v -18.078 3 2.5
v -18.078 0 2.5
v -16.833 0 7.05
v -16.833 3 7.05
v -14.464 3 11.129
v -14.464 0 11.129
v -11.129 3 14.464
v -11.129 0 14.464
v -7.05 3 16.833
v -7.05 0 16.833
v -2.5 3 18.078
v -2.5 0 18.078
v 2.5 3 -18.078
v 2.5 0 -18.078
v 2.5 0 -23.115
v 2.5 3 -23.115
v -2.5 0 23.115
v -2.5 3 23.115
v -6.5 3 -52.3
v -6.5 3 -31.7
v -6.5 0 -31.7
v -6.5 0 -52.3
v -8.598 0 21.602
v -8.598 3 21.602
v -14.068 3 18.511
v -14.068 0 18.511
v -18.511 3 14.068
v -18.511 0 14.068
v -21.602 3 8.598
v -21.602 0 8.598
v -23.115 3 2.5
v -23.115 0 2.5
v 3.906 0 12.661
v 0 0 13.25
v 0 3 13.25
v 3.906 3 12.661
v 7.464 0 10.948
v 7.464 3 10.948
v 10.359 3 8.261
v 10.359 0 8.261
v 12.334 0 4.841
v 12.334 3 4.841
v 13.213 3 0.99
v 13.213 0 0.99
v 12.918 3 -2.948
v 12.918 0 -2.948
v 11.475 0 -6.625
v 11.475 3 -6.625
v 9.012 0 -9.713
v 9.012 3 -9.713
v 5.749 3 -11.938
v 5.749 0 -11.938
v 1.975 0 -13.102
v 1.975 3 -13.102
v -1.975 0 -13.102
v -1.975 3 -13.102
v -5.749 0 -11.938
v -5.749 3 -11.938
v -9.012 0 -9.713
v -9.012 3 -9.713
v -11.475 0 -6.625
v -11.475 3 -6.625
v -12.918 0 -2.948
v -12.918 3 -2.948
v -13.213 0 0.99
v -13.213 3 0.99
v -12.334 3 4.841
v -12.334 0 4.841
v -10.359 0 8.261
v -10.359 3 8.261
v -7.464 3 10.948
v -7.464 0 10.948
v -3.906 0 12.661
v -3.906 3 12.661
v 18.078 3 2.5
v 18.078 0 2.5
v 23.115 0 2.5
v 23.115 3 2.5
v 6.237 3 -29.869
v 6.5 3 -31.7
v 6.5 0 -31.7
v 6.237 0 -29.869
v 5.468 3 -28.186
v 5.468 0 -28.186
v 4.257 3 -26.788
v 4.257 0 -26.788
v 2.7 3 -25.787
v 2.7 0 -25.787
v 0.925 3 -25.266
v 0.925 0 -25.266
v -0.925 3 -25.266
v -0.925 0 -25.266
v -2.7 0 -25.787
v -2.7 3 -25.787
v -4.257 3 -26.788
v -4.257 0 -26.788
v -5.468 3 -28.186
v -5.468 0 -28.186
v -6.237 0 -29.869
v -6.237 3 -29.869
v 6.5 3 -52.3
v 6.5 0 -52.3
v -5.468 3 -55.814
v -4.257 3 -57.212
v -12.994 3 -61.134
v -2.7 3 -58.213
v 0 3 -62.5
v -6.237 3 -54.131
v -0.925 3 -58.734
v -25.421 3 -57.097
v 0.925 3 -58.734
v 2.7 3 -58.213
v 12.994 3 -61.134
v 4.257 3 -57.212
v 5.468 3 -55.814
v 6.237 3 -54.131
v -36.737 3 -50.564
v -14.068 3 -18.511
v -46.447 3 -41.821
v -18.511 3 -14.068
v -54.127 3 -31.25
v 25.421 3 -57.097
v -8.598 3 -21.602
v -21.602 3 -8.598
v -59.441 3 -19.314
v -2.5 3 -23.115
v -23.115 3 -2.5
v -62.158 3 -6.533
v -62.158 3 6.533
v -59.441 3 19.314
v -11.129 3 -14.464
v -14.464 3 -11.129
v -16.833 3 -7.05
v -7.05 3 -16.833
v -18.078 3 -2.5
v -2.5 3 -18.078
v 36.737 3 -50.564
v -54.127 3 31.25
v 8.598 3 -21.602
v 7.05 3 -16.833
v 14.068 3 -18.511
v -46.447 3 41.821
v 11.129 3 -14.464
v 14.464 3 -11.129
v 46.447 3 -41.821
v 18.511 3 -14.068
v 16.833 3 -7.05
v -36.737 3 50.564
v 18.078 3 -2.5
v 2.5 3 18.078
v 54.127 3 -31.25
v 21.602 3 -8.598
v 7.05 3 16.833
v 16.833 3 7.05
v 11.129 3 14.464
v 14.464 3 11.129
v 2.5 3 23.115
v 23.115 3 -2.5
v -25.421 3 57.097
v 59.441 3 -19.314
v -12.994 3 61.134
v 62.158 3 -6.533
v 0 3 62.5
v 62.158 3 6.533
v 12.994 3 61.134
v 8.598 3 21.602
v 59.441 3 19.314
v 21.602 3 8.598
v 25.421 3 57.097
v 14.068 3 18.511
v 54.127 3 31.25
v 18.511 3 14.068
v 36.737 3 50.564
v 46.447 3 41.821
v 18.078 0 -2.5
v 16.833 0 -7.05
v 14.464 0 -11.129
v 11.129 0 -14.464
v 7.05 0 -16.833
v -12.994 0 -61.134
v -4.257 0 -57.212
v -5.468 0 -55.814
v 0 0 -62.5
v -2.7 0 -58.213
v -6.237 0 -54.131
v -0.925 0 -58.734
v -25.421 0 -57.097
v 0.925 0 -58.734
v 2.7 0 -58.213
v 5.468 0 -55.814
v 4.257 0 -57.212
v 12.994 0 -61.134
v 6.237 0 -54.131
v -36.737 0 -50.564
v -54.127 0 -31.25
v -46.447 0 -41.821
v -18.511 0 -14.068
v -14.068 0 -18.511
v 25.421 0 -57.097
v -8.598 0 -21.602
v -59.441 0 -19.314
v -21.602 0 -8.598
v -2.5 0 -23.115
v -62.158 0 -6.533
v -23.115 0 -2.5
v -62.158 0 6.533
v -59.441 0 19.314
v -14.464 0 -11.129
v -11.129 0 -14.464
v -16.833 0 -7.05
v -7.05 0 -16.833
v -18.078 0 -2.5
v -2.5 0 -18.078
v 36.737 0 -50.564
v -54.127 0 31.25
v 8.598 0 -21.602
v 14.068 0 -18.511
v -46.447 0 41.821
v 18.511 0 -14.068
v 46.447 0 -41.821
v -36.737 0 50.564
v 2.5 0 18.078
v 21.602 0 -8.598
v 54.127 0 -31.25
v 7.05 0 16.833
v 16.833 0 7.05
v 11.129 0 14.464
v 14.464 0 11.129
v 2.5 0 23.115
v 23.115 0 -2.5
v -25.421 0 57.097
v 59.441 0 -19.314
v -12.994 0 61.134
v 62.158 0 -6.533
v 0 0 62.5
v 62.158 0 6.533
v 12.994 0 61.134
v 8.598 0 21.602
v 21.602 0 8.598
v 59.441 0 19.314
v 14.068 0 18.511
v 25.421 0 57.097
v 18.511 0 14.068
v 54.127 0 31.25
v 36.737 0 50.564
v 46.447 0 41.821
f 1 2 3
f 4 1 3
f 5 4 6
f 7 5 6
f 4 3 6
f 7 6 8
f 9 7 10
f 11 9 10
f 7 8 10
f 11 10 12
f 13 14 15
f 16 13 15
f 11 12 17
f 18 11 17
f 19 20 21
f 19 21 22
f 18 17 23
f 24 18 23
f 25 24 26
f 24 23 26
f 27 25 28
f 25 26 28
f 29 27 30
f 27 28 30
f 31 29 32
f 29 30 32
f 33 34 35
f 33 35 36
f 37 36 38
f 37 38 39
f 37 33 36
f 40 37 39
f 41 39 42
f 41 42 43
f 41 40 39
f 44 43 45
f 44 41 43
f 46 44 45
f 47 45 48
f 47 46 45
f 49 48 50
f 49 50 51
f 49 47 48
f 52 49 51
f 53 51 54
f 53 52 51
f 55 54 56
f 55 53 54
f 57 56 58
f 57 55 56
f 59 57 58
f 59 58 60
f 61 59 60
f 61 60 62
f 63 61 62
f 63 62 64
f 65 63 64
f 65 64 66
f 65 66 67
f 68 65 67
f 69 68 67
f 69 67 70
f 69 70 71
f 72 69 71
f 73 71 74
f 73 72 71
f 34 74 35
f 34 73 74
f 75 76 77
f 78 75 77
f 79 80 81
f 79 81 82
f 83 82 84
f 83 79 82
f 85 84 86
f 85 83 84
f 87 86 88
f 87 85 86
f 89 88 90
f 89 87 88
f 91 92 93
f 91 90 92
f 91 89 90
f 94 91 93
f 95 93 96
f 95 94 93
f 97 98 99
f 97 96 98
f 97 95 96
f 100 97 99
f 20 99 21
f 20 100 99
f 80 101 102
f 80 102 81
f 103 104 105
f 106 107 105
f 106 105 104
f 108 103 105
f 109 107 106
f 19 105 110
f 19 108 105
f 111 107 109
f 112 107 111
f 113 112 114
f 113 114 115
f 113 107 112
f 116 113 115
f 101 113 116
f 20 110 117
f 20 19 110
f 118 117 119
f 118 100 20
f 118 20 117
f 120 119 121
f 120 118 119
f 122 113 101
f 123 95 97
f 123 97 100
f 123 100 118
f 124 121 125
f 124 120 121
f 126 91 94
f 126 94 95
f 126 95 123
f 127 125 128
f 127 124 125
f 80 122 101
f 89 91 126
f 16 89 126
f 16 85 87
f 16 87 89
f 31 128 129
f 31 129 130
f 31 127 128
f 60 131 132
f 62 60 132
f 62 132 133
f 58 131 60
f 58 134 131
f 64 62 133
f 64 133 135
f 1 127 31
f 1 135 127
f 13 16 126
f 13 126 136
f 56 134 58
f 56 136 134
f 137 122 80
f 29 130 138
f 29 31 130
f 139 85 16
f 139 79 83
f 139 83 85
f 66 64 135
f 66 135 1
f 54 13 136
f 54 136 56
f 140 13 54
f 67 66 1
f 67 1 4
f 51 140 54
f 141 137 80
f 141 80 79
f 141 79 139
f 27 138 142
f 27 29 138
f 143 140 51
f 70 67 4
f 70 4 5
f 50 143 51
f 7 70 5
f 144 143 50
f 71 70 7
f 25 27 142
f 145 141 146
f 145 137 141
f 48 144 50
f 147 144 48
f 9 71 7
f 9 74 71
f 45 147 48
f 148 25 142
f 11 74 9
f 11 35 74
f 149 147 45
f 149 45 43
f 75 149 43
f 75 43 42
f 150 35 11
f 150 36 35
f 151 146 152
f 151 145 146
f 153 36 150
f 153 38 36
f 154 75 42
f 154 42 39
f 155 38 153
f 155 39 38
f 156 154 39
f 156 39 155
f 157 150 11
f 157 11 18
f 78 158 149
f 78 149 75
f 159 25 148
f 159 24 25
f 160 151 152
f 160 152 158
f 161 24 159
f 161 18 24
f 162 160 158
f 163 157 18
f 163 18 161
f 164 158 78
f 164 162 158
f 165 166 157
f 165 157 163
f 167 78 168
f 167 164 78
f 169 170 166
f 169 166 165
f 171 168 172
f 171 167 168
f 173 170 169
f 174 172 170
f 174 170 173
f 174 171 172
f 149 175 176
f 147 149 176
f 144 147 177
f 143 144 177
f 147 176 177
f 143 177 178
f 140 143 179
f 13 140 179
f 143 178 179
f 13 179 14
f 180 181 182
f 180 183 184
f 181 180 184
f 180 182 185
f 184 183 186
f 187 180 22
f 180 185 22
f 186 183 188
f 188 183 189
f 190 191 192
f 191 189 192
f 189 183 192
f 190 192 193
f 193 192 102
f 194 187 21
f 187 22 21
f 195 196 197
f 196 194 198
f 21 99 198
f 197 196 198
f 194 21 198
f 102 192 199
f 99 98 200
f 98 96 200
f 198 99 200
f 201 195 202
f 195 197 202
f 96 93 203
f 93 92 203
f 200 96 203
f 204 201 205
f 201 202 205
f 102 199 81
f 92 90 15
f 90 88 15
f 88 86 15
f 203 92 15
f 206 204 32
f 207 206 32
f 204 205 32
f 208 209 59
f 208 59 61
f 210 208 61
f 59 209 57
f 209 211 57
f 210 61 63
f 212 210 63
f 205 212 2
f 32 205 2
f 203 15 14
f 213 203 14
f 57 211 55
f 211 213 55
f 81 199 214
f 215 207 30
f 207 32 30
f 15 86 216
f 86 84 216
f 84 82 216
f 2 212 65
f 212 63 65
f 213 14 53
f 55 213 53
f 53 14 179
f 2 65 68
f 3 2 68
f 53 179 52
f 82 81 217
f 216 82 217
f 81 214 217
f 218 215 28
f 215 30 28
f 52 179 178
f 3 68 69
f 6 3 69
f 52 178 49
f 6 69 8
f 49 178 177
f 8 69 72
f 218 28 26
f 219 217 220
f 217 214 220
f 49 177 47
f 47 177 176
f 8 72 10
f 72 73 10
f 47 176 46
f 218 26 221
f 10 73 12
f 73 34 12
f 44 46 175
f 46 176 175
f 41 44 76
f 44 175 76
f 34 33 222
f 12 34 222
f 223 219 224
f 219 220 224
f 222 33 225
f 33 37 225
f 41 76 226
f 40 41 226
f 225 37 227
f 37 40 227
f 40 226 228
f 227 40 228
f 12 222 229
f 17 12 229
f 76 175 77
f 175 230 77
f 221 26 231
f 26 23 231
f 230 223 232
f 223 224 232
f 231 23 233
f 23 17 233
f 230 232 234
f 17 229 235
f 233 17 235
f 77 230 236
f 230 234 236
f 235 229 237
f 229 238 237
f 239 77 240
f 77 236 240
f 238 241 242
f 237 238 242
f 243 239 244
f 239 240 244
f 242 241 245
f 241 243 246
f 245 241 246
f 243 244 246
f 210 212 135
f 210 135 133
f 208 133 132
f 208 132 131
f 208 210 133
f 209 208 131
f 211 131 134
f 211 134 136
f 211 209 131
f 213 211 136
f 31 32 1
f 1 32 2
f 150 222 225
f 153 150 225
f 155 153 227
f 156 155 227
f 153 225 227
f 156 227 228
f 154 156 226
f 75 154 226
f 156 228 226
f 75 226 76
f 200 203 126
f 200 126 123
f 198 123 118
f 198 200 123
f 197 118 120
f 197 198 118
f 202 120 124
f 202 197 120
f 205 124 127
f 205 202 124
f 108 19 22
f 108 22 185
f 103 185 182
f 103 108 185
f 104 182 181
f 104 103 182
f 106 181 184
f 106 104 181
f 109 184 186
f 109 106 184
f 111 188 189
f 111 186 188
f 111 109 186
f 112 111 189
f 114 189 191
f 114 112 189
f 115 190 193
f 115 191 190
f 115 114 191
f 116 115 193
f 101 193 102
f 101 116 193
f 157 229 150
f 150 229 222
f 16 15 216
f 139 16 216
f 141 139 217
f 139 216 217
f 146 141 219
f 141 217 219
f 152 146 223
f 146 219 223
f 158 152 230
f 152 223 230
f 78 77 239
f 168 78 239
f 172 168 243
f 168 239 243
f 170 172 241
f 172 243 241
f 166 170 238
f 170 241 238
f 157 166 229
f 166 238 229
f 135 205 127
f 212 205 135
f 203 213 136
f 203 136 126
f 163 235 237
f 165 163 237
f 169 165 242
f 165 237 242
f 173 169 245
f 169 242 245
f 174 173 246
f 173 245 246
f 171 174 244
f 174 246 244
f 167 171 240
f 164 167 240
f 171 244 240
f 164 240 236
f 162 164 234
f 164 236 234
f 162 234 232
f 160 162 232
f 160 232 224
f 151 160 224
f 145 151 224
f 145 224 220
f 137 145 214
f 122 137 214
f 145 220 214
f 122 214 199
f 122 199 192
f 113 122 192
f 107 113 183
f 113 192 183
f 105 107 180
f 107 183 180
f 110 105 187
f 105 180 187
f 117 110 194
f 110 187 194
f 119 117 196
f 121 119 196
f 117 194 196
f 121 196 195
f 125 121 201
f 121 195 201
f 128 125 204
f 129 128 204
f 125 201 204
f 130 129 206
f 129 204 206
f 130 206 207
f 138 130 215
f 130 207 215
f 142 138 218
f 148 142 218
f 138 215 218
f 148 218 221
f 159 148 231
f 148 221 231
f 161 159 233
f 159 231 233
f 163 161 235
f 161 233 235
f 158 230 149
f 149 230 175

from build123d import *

# Parameters (mm, degrees)
SKETCH1_R           = 62.5
SKETCH1_R_2         = 13.25
BOSS_EXTRUDE1_DEPTH = 3
CUT_EXTRUDE1_DEPTH  = 89.439244682


with BuildPart() as part:
    # Sketch1 → Boss-Extrude1 (new body)
    with BuildSketch(Plane(origin=(0, 0, 0), x_dir=(1, 0, 0), z_dir=(0, 1, 0))):
        with Locations(Location((0, 0, 0), (0, 0, 270))):
            Circle(SKETCH1_R)
        with Locations(Location((0, 0, 0), (0, 0, 270))):
            Circle(SKETCH1_R_2, mode=Mode.SUBTRACT)
        with BuildLine():
            Line((-2.5, 18.07795619), (-2.5, 23.115200626))
            ThreePointArc((-2.5, 23.115200626), (-16.440232663, 16.440232663), (-23.115200626, 2.5))
            Line((-23.115200626, 2.5), (-18.07795619, 2.5))
            ThreePointArc((-18.07795619, 2.5), (-12.904698757, 12.904698757), (-2.5, 18.07795619))
        make_face(mode=Mode.SUBTRACT)
        with BuildLine():
            Line((2.5, 18.07795619), (2.5, 23.115200626))
            ThreePointArc((2.5, 23.115200626), (16.440232663, 16.440232663), (23.115200626, 2.5))
            Line((23.115200626, 2.5), (18.07795619, 2.5))
            ThreePointArc((18.07795619, 2.5), (12.904698757, 12.904698757), (2.5, 18.07795619))
        make_face(mode=Mode.SUBTRACT)
        with BuildLine():
            Line((18.07795619, -2.5), (23.115200626, -2.5))
            ThreePointArc((23.115200626, -2.5), (16.440232663, -16.440232663), (2.5, -23.115200626))
            Line((2.5, -23.115200626), (2.5, -18.07795619))
            ThreePointArc((2.5, -18.07795619), (12.904698757, -12.904698757), (18.07795619, -2.5))
        make_face(mode=Mode.SUBTRACT)
        with BuildLine():
            Line((-2.5, -18.07795619), (-2.5, -23.115200626))
            ThreePointArc((-2.5, -23.115200626), (-16.440232663, -16.440232663), (-23.115200626, -2.5))
            Line((-23.115200626, -2.5), (-18.07795619, -2.5))
            ThreePointArc((-18.07795619, -2.5), (-12.904698757, -12.904698757), (-2.5, -18.07795619))
        make_face(mode=Mode.SUBTRACT)
    extrude(amount=BOSS_EXTRUDE1_DEPTH)

    # Sketch4 → Cut-Extrude1 (cut, through all)
    with BuildSketch(Plane(origin=(0, 3, 0), x_dir=(1, 0, 0), z_dir=(0, 1, 0))):
        with BuildLine():
            Line((-6.5, 31.7), (-6.5, 52.3))
            ThreePointArc((-6.5, 52.3), (0, 58.8), (6.5, 52.3))
            Line((6.5, 52.3), (6.5, 31.7))
            ThreePointArc((6.5, 31.7), (0, 25.2), (-6.5, 31.7))
        make_face()
    extrude(amount=-CUT_EXTRUDE1_DEPTH, mode=Mode.SUBTRACT)


solid = part.part
